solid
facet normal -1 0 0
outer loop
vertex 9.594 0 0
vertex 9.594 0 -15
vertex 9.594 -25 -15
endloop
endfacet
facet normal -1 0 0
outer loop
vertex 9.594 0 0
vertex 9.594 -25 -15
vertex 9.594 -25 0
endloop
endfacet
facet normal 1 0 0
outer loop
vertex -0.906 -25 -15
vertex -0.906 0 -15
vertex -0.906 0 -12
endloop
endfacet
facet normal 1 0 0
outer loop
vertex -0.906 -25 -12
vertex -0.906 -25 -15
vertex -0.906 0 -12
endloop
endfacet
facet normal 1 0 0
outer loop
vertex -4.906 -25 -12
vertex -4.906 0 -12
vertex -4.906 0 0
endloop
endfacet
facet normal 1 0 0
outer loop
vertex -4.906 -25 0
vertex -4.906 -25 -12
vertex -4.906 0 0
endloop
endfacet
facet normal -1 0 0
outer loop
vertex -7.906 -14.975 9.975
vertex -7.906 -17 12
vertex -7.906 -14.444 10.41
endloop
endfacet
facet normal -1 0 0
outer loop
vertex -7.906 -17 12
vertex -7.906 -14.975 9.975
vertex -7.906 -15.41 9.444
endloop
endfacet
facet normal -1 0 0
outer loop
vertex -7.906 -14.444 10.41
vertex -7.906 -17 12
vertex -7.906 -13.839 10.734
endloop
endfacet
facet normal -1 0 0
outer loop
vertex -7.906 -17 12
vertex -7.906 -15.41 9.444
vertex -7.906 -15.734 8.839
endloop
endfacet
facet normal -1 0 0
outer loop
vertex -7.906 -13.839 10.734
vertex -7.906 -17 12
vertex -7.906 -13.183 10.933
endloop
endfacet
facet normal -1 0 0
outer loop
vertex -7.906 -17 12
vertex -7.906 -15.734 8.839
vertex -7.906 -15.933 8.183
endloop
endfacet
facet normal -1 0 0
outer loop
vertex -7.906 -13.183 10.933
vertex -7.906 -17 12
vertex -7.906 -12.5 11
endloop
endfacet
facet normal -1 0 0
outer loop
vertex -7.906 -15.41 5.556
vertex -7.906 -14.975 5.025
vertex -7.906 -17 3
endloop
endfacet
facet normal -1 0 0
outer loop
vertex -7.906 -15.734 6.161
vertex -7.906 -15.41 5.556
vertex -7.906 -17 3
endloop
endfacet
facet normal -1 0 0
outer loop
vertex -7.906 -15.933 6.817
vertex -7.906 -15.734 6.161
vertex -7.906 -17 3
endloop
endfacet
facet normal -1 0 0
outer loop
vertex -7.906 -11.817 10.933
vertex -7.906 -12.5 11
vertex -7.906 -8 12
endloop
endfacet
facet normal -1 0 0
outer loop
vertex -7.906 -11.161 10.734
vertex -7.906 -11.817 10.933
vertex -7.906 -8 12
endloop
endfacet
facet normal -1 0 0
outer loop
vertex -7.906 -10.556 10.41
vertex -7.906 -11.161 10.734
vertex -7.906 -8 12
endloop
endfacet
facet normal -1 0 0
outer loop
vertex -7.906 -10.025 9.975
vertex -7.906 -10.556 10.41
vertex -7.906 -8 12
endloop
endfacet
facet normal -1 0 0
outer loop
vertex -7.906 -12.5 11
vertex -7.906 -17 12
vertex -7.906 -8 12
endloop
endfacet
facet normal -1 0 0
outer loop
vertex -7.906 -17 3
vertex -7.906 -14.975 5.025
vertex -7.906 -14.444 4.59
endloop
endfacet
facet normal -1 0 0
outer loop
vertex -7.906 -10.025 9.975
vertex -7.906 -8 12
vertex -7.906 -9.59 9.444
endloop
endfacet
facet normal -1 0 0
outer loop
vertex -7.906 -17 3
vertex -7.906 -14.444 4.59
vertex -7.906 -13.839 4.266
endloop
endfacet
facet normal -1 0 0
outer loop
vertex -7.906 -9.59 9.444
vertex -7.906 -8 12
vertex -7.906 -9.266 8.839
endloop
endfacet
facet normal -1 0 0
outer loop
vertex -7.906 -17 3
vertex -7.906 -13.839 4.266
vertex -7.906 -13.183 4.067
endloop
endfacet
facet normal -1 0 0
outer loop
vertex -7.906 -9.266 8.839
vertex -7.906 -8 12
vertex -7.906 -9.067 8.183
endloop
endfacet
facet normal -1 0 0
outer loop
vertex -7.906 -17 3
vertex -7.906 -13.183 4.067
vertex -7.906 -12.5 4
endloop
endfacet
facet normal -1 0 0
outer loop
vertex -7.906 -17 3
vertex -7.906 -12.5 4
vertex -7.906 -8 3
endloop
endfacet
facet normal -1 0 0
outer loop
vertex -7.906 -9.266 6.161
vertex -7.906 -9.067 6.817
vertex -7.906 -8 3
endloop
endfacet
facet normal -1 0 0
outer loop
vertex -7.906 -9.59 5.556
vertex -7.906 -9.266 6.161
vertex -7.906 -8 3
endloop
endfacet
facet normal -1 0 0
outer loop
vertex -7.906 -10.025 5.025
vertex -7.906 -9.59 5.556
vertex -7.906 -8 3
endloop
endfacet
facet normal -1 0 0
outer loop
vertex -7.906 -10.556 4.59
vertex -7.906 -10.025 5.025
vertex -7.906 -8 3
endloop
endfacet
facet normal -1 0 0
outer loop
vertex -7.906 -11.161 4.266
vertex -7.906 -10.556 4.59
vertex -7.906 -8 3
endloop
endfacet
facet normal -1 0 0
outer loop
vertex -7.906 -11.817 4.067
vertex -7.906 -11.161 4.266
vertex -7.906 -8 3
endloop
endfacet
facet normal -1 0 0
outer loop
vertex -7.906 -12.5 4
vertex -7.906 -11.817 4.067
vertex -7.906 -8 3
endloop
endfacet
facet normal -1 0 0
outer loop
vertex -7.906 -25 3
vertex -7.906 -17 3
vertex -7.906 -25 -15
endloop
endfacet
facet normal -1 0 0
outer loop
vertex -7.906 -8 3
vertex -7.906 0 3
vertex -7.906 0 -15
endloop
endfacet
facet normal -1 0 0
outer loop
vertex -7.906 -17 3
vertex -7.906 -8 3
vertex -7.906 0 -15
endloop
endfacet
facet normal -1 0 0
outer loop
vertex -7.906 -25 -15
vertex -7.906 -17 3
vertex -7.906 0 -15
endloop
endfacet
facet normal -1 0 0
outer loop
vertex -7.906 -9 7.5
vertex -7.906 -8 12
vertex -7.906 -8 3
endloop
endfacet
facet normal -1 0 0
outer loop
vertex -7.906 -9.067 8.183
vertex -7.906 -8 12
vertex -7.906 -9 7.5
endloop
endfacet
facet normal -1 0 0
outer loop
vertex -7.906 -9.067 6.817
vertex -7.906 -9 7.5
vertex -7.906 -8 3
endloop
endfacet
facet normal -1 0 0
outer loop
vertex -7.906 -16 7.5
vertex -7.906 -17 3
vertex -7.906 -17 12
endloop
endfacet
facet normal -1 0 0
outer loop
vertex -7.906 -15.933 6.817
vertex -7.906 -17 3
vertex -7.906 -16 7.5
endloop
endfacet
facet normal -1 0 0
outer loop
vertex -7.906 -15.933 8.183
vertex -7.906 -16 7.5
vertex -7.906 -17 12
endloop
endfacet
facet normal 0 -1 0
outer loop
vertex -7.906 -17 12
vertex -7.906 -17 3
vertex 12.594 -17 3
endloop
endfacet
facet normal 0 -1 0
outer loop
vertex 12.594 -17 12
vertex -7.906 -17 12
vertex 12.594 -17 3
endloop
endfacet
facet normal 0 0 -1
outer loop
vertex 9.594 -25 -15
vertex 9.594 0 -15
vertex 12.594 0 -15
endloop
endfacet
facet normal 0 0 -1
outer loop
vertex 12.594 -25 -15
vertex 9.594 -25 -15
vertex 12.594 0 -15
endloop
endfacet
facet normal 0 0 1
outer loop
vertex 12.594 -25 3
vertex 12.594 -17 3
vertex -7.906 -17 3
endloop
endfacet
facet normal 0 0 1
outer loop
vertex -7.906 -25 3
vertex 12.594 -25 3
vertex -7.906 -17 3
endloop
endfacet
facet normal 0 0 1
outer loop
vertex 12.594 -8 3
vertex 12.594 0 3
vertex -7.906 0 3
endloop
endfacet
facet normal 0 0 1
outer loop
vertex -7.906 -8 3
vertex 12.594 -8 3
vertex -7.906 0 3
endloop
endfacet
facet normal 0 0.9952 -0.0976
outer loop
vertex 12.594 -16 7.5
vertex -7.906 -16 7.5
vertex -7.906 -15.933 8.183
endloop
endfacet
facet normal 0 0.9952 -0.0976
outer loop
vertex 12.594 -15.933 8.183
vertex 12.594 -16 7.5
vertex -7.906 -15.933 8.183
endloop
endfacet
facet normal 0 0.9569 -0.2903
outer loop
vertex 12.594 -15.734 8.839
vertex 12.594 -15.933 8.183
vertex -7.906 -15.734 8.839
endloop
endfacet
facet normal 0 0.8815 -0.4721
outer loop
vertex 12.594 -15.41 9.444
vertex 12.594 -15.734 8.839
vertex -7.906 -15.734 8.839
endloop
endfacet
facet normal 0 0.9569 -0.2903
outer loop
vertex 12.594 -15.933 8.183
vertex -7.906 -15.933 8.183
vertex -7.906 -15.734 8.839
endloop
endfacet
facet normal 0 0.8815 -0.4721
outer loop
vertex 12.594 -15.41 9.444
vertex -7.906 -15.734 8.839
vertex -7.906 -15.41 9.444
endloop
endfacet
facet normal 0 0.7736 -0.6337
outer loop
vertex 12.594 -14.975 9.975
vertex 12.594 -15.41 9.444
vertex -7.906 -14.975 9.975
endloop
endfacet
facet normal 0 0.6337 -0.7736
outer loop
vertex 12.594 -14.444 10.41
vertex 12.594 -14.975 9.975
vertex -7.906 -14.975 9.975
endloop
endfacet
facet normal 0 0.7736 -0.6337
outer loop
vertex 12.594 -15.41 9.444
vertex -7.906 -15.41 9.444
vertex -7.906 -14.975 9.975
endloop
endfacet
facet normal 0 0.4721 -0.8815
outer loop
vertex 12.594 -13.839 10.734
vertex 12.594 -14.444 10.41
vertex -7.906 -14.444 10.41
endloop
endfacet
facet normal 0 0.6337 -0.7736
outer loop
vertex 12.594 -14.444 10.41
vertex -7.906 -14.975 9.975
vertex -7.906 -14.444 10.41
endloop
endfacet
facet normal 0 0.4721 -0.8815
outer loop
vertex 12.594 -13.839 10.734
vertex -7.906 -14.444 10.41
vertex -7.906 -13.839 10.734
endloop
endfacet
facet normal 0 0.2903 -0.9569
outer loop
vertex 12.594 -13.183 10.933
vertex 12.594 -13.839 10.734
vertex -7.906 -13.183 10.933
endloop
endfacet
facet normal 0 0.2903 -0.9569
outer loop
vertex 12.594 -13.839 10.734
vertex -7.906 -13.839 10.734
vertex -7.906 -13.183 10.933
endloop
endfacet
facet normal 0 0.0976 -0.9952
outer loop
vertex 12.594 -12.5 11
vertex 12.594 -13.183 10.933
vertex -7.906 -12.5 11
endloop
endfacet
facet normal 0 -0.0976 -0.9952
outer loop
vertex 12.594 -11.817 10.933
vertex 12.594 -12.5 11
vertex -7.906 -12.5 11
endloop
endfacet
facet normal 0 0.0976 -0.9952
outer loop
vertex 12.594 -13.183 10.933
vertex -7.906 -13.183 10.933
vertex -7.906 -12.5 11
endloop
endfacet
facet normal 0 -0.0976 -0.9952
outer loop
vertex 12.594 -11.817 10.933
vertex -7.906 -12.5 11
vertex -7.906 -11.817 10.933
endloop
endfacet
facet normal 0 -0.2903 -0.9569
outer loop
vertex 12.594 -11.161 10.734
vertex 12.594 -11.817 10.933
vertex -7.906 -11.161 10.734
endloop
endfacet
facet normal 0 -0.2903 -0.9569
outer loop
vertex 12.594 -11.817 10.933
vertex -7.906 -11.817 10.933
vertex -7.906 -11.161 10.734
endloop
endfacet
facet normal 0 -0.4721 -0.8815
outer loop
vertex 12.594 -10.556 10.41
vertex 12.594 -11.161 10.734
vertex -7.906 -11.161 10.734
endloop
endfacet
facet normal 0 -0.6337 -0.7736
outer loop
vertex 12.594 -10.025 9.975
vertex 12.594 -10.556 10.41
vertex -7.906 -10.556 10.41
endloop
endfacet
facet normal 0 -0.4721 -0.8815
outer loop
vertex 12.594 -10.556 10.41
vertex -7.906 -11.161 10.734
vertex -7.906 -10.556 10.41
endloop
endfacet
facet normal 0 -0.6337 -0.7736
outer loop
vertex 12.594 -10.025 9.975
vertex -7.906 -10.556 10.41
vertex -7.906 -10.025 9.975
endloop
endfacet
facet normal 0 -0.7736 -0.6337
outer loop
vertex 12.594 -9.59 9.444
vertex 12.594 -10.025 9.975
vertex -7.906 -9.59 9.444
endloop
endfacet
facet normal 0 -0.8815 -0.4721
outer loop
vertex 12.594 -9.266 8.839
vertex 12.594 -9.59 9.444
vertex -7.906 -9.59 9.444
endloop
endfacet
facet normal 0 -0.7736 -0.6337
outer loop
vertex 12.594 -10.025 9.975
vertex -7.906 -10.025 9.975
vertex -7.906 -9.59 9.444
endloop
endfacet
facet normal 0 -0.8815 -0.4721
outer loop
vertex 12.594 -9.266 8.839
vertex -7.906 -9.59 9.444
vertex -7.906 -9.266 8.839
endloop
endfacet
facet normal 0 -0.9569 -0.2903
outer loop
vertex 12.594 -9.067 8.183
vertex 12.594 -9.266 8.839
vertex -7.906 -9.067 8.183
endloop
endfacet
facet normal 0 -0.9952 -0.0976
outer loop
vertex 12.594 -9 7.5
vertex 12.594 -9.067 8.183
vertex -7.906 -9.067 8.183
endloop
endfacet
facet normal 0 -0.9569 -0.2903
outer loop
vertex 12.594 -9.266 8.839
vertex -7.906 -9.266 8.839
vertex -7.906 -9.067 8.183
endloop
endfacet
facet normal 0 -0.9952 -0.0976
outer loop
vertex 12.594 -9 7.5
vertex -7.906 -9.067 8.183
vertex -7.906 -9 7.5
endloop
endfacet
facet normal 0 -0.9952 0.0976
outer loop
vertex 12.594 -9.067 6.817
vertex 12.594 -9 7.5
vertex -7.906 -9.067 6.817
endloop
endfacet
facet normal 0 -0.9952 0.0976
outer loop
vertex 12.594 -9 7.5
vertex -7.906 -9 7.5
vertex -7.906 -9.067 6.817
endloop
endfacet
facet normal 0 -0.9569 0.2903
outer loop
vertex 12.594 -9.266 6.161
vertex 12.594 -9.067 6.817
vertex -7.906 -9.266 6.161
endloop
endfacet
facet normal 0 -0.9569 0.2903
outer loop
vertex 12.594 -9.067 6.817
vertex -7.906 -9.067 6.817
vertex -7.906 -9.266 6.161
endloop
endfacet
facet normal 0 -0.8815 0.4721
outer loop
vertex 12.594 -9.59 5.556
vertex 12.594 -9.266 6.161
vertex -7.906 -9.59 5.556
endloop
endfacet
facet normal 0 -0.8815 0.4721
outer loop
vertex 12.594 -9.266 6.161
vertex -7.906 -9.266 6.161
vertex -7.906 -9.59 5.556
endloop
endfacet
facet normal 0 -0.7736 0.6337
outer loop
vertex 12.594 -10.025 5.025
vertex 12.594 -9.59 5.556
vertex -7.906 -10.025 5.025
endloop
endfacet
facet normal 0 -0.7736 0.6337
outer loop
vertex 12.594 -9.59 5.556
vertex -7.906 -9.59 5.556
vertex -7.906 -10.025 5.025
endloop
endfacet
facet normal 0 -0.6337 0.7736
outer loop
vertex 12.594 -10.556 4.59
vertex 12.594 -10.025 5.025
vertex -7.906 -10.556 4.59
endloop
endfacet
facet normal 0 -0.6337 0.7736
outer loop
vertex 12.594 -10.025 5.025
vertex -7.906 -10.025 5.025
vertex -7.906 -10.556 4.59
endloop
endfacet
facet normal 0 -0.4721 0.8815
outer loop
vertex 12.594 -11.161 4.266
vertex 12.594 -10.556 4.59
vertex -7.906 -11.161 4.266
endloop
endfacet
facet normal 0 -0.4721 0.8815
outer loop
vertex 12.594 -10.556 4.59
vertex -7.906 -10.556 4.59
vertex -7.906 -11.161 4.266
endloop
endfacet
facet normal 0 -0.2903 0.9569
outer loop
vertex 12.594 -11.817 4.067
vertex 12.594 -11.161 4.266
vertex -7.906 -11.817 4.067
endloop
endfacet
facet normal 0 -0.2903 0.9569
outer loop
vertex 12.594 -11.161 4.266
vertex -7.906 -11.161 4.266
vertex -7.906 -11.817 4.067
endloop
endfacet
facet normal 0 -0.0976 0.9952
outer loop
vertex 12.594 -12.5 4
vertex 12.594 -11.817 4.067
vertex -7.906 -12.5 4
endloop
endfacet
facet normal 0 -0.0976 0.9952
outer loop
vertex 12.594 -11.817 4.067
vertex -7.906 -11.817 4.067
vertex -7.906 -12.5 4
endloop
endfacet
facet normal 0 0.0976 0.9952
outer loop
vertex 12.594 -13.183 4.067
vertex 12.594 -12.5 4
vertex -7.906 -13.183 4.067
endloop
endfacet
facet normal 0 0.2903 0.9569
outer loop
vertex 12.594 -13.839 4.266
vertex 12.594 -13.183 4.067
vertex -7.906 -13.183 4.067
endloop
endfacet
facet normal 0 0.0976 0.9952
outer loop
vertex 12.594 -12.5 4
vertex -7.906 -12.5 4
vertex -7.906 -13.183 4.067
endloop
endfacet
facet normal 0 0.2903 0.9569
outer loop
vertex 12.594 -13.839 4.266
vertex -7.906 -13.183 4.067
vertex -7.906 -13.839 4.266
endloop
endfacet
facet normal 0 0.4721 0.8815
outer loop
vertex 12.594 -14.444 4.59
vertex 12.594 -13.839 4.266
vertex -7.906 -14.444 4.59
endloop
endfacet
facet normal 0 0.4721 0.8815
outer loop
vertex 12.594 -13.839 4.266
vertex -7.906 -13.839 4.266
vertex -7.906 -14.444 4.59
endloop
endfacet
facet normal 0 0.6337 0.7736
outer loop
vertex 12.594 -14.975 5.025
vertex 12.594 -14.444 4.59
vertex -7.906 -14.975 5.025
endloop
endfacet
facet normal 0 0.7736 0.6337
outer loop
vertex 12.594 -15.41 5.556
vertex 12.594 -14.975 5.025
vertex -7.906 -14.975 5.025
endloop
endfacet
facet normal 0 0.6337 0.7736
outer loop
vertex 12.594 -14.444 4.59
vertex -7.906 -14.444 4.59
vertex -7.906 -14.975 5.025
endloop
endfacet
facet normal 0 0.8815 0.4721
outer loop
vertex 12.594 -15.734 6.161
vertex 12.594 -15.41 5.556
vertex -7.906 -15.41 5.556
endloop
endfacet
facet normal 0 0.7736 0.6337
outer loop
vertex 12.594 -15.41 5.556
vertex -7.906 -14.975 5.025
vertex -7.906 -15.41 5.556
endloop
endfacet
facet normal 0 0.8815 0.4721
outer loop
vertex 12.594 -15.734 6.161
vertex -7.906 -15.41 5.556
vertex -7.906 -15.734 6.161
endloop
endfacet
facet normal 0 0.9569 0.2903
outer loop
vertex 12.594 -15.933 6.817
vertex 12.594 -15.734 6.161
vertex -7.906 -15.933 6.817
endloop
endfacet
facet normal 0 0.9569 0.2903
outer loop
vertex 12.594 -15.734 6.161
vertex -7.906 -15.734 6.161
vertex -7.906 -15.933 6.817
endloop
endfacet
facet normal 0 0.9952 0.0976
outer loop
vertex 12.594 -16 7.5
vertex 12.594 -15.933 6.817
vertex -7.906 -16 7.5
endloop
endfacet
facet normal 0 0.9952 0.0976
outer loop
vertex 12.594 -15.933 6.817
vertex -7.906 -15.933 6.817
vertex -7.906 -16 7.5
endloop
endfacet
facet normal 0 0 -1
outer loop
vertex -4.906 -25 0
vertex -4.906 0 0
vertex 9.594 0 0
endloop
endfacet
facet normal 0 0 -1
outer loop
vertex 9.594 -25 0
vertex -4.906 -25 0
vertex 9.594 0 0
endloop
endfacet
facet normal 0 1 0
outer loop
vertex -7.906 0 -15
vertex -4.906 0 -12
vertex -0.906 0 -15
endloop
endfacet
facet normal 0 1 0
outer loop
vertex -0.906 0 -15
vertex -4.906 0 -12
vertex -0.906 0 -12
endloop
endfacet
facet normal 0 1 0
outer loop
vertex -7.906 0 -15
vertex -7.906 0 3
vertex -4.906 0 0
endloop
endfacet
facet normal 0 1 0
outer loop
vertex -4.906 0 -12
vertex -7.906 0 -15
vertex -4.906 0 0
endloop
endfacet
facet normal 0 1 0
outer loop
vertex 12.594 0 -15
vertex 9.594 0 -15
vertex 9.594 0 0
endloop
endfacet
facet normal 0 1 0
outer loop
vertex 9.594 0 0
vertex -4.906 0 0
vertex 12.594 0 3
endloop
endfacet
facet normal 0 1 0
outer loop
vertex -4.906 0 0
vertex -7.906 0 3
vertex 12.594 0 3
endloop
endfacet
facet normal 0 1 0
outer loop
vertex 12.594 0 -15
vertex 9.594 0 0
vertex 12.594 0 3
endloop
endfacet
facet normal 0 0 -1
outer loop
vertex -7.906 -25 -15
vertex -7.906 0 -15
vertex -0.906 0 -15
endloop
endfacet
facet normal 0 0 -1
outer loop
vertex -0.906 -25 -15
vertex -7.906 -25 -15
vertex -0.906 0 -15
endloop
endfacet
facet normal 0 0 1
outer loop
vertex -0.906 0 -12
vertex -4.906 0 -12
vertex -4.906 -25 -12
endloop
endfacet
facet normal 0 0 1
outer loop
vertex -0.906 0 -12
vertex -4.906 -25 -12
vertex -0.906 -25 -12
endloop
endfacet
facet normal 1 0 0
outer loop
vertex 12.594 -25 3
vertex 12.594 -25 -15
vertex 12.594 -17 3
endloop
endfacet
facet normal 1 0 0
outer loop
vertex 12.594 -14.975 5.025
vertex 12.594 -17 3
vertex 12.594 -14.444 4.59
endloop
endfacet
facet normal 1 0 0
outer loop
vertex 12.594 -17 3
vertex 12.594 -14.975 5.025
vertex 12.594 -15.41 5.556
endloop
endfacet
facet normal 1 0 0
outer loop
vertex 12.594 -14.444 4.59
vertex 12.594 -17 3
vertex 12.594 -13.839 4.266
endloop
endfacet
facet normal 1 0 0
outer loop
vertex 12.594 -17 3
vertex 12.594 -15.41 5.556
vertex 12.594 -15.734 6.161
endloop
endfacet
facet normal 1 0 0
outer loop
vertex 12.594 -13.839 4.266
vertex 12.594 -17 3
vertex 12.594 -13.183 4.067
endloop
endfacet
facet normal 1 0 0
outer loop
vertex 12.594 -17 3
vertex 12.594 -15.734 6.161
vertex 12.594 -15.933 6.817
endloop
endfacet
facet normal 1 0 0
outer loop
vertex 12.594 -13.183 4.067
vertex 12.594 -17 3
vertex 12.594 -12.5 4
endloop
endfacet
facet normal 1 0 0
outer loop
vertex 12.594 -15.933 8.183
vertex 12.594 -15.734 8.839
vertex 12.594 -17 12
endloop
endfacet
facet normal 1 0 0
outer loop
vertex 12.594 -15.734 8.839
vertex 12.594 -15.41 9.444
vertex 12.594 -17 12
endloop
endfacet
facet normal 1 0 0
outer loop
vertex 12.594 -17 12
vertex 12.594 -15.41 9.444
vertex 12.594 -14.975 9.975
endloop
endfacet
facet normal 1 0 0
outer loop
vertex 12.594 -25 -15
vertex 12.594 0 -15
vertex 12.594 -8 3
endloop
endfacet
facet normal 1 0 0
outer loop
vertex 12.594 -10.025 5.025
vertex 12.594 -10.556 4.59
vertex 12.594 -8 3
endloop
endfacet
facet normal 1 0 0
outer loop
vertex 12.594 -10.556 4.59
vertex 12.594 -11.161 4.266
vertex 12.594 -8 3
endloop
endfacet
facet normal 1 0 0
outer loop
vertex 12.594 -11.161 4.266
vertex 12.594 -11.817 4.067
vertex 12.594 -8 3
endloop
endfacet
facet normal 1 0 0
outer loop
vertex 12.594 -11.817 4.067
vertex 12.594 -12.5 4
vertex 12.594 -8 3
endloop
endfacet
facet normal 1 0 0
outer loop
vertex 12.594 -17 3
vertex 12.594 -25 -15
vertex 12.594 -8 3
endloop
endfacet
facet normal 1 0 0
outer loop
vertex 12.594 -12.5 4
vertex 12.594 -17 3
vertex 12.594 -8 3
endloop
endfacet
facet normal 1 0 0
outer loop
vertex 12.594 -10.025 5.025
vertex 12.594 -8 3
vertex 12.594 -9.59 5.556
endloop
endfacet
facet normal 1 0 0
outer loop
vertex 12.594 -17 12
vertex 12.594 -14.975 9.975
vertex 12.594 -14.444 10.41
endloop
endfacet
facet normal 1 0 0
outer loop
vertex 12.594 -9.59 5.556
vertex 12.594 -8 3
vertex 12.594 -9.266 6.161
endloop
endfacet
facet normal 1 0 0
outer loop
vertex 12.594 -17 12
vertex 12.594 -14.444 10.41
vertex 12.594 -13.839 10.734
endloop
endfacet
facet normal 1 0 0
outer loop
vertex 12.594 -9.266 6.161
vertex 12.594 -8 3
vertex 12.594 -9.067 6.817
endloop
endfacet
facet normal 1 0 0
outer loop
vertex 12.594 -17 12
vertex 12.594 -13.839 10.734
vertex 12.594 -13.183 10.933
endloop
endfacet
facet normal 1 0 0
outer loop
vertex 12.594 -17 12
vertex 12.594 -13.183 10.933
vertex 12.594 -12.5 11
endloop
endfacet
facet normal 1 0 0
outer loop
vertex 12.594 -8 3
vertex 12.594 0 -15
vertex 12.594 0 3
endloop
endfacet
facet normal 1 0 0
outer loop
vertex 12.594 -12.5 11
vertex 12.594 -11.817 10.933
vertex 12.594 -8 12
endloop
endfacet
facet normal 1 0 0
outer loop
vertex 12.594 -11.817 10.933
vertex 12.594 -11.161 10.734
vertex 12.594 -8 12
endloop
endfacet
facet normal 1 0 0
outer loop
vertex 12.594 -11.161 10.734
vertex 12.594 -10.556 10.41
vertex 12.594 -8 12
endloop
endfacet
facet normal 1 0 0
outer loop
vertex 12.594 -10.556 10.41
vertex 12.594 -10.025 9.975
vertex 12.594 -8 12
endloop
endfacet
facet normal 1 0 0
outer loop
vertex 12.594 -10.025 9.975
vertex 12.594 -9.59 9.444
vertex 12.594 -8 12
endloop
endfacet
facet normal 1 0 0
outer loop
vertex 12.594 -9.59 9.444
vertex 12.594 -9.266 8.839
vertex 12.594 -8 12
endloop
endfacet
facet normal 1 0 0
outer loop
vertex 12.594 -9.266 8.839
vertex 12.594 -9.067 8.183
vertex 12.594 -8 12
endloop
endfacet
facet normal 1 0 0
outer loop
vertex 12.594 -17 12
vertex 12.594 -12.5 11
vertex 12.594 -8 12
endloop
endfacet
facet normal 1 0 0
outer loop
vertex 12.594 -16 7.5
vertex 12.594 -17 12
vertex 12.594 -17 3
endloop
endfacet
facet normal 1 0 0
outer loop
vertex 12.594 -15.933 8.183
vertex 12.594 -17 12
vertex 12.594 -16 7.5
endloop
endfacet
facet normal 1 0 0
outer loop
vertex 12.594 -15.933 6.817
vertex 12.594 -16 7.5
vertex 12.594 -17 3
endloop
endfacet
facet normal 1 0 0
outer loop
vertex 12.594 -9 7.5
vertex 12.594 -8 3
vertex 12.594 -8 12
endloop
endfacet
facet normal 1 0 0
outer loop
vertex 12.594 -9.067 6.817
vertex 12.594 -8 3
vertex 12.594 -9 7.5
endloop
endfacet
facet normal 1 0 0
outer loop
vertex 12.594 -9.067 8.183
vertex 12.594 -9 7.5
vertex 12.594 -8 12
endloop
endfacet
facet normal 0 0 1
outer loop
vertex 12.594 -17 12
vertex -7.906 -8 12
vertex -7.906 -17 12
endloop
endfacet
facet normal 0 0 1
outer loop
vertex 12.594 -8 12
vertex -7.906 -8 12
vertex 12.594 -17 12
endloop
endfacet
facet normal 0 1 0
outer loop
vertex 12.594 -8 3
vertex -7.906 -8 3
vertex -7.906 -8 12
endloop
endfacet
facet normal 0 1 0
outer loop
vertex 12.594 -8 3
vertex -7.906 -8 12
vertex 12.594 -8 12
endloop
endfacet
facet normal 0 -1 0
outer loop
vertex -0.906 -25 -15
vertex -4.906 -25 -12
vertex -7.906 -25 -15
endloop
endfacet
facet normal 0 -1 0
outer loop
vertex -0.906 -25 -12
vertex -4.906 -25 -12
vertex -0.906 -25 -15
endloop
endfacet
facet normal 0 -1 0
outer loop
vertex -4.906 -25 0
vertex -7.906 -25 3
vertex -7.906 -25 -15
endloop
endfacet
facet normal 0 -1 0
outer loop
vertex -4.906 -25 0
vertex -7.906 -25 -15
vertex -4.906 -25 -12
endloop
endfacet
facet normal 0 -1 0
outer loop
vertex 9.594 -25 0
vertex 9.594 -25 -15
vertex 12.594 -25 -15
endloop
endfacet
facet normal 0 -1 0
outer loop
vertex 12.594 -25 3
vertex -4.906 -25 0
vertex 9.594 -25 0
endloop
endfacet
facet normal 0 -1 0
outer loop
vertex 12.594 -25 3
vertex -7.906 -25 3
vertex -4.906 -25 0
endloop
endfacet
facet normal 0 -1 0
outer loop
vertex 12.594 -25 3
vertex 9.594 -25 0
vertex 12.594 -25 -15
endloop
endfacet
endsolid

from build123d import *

# Parameters (mm, degrees)
F0_W     = 4
F0_H     = 3
F0_W_2   = 3
F0_H_2   = 15
F1_DEPTH = 25
F2_W     = 20.5
F2_H     = 9
F3_DEPTH = 9
F4_R     = 3.5
F5_DEPTH = 20.5


with BuildPart() as f1:
    # F0 (on Front) → F1 (new body)
    with BuildSketch(Plane.XZ):
        Polygon((-7.90625, 3), (-7.90625, 0), (-4.90625, 0), (9.59375, 0), (12.59375, 0), (12.59375, 3), align=None)
        Polygon((-4.90625, 0), (-7.90625, 0), (-7.90625, -15), (-4.90625, -15), (-4.90625, -12), align=None)
        with Locations((-2.90625, -13.5)):
            Rectangle(F0_W, F0_H)
        with Locations((11.09375, -7.5)):
            Rectangle(F0_W_2, F0_H_2)
    extrude(amount=F1_DEPTH)

    # F2 (on face) → F3 (join)
    with BuildSketch(Plane.XY.offset(3)):
        with Locations((2.34375, -12.5)):
            Rectangle(F2_W, F2_H)
    extrude(amount=F3_DEPTH)

    # F4 (on face) → F5 (cut)
    with BuildSketch(Plane(origin=(-7.90625, 0, 0), x_dir=(0, -1, 0), z_dir=(-1, 0, 0))):
        with Locations((12.5, 7.5)):
            Circle(F4_R)
    extrude(amount=-F5_DEPTH, mode=Mode.SUBTRACT)


solid = f1.part
